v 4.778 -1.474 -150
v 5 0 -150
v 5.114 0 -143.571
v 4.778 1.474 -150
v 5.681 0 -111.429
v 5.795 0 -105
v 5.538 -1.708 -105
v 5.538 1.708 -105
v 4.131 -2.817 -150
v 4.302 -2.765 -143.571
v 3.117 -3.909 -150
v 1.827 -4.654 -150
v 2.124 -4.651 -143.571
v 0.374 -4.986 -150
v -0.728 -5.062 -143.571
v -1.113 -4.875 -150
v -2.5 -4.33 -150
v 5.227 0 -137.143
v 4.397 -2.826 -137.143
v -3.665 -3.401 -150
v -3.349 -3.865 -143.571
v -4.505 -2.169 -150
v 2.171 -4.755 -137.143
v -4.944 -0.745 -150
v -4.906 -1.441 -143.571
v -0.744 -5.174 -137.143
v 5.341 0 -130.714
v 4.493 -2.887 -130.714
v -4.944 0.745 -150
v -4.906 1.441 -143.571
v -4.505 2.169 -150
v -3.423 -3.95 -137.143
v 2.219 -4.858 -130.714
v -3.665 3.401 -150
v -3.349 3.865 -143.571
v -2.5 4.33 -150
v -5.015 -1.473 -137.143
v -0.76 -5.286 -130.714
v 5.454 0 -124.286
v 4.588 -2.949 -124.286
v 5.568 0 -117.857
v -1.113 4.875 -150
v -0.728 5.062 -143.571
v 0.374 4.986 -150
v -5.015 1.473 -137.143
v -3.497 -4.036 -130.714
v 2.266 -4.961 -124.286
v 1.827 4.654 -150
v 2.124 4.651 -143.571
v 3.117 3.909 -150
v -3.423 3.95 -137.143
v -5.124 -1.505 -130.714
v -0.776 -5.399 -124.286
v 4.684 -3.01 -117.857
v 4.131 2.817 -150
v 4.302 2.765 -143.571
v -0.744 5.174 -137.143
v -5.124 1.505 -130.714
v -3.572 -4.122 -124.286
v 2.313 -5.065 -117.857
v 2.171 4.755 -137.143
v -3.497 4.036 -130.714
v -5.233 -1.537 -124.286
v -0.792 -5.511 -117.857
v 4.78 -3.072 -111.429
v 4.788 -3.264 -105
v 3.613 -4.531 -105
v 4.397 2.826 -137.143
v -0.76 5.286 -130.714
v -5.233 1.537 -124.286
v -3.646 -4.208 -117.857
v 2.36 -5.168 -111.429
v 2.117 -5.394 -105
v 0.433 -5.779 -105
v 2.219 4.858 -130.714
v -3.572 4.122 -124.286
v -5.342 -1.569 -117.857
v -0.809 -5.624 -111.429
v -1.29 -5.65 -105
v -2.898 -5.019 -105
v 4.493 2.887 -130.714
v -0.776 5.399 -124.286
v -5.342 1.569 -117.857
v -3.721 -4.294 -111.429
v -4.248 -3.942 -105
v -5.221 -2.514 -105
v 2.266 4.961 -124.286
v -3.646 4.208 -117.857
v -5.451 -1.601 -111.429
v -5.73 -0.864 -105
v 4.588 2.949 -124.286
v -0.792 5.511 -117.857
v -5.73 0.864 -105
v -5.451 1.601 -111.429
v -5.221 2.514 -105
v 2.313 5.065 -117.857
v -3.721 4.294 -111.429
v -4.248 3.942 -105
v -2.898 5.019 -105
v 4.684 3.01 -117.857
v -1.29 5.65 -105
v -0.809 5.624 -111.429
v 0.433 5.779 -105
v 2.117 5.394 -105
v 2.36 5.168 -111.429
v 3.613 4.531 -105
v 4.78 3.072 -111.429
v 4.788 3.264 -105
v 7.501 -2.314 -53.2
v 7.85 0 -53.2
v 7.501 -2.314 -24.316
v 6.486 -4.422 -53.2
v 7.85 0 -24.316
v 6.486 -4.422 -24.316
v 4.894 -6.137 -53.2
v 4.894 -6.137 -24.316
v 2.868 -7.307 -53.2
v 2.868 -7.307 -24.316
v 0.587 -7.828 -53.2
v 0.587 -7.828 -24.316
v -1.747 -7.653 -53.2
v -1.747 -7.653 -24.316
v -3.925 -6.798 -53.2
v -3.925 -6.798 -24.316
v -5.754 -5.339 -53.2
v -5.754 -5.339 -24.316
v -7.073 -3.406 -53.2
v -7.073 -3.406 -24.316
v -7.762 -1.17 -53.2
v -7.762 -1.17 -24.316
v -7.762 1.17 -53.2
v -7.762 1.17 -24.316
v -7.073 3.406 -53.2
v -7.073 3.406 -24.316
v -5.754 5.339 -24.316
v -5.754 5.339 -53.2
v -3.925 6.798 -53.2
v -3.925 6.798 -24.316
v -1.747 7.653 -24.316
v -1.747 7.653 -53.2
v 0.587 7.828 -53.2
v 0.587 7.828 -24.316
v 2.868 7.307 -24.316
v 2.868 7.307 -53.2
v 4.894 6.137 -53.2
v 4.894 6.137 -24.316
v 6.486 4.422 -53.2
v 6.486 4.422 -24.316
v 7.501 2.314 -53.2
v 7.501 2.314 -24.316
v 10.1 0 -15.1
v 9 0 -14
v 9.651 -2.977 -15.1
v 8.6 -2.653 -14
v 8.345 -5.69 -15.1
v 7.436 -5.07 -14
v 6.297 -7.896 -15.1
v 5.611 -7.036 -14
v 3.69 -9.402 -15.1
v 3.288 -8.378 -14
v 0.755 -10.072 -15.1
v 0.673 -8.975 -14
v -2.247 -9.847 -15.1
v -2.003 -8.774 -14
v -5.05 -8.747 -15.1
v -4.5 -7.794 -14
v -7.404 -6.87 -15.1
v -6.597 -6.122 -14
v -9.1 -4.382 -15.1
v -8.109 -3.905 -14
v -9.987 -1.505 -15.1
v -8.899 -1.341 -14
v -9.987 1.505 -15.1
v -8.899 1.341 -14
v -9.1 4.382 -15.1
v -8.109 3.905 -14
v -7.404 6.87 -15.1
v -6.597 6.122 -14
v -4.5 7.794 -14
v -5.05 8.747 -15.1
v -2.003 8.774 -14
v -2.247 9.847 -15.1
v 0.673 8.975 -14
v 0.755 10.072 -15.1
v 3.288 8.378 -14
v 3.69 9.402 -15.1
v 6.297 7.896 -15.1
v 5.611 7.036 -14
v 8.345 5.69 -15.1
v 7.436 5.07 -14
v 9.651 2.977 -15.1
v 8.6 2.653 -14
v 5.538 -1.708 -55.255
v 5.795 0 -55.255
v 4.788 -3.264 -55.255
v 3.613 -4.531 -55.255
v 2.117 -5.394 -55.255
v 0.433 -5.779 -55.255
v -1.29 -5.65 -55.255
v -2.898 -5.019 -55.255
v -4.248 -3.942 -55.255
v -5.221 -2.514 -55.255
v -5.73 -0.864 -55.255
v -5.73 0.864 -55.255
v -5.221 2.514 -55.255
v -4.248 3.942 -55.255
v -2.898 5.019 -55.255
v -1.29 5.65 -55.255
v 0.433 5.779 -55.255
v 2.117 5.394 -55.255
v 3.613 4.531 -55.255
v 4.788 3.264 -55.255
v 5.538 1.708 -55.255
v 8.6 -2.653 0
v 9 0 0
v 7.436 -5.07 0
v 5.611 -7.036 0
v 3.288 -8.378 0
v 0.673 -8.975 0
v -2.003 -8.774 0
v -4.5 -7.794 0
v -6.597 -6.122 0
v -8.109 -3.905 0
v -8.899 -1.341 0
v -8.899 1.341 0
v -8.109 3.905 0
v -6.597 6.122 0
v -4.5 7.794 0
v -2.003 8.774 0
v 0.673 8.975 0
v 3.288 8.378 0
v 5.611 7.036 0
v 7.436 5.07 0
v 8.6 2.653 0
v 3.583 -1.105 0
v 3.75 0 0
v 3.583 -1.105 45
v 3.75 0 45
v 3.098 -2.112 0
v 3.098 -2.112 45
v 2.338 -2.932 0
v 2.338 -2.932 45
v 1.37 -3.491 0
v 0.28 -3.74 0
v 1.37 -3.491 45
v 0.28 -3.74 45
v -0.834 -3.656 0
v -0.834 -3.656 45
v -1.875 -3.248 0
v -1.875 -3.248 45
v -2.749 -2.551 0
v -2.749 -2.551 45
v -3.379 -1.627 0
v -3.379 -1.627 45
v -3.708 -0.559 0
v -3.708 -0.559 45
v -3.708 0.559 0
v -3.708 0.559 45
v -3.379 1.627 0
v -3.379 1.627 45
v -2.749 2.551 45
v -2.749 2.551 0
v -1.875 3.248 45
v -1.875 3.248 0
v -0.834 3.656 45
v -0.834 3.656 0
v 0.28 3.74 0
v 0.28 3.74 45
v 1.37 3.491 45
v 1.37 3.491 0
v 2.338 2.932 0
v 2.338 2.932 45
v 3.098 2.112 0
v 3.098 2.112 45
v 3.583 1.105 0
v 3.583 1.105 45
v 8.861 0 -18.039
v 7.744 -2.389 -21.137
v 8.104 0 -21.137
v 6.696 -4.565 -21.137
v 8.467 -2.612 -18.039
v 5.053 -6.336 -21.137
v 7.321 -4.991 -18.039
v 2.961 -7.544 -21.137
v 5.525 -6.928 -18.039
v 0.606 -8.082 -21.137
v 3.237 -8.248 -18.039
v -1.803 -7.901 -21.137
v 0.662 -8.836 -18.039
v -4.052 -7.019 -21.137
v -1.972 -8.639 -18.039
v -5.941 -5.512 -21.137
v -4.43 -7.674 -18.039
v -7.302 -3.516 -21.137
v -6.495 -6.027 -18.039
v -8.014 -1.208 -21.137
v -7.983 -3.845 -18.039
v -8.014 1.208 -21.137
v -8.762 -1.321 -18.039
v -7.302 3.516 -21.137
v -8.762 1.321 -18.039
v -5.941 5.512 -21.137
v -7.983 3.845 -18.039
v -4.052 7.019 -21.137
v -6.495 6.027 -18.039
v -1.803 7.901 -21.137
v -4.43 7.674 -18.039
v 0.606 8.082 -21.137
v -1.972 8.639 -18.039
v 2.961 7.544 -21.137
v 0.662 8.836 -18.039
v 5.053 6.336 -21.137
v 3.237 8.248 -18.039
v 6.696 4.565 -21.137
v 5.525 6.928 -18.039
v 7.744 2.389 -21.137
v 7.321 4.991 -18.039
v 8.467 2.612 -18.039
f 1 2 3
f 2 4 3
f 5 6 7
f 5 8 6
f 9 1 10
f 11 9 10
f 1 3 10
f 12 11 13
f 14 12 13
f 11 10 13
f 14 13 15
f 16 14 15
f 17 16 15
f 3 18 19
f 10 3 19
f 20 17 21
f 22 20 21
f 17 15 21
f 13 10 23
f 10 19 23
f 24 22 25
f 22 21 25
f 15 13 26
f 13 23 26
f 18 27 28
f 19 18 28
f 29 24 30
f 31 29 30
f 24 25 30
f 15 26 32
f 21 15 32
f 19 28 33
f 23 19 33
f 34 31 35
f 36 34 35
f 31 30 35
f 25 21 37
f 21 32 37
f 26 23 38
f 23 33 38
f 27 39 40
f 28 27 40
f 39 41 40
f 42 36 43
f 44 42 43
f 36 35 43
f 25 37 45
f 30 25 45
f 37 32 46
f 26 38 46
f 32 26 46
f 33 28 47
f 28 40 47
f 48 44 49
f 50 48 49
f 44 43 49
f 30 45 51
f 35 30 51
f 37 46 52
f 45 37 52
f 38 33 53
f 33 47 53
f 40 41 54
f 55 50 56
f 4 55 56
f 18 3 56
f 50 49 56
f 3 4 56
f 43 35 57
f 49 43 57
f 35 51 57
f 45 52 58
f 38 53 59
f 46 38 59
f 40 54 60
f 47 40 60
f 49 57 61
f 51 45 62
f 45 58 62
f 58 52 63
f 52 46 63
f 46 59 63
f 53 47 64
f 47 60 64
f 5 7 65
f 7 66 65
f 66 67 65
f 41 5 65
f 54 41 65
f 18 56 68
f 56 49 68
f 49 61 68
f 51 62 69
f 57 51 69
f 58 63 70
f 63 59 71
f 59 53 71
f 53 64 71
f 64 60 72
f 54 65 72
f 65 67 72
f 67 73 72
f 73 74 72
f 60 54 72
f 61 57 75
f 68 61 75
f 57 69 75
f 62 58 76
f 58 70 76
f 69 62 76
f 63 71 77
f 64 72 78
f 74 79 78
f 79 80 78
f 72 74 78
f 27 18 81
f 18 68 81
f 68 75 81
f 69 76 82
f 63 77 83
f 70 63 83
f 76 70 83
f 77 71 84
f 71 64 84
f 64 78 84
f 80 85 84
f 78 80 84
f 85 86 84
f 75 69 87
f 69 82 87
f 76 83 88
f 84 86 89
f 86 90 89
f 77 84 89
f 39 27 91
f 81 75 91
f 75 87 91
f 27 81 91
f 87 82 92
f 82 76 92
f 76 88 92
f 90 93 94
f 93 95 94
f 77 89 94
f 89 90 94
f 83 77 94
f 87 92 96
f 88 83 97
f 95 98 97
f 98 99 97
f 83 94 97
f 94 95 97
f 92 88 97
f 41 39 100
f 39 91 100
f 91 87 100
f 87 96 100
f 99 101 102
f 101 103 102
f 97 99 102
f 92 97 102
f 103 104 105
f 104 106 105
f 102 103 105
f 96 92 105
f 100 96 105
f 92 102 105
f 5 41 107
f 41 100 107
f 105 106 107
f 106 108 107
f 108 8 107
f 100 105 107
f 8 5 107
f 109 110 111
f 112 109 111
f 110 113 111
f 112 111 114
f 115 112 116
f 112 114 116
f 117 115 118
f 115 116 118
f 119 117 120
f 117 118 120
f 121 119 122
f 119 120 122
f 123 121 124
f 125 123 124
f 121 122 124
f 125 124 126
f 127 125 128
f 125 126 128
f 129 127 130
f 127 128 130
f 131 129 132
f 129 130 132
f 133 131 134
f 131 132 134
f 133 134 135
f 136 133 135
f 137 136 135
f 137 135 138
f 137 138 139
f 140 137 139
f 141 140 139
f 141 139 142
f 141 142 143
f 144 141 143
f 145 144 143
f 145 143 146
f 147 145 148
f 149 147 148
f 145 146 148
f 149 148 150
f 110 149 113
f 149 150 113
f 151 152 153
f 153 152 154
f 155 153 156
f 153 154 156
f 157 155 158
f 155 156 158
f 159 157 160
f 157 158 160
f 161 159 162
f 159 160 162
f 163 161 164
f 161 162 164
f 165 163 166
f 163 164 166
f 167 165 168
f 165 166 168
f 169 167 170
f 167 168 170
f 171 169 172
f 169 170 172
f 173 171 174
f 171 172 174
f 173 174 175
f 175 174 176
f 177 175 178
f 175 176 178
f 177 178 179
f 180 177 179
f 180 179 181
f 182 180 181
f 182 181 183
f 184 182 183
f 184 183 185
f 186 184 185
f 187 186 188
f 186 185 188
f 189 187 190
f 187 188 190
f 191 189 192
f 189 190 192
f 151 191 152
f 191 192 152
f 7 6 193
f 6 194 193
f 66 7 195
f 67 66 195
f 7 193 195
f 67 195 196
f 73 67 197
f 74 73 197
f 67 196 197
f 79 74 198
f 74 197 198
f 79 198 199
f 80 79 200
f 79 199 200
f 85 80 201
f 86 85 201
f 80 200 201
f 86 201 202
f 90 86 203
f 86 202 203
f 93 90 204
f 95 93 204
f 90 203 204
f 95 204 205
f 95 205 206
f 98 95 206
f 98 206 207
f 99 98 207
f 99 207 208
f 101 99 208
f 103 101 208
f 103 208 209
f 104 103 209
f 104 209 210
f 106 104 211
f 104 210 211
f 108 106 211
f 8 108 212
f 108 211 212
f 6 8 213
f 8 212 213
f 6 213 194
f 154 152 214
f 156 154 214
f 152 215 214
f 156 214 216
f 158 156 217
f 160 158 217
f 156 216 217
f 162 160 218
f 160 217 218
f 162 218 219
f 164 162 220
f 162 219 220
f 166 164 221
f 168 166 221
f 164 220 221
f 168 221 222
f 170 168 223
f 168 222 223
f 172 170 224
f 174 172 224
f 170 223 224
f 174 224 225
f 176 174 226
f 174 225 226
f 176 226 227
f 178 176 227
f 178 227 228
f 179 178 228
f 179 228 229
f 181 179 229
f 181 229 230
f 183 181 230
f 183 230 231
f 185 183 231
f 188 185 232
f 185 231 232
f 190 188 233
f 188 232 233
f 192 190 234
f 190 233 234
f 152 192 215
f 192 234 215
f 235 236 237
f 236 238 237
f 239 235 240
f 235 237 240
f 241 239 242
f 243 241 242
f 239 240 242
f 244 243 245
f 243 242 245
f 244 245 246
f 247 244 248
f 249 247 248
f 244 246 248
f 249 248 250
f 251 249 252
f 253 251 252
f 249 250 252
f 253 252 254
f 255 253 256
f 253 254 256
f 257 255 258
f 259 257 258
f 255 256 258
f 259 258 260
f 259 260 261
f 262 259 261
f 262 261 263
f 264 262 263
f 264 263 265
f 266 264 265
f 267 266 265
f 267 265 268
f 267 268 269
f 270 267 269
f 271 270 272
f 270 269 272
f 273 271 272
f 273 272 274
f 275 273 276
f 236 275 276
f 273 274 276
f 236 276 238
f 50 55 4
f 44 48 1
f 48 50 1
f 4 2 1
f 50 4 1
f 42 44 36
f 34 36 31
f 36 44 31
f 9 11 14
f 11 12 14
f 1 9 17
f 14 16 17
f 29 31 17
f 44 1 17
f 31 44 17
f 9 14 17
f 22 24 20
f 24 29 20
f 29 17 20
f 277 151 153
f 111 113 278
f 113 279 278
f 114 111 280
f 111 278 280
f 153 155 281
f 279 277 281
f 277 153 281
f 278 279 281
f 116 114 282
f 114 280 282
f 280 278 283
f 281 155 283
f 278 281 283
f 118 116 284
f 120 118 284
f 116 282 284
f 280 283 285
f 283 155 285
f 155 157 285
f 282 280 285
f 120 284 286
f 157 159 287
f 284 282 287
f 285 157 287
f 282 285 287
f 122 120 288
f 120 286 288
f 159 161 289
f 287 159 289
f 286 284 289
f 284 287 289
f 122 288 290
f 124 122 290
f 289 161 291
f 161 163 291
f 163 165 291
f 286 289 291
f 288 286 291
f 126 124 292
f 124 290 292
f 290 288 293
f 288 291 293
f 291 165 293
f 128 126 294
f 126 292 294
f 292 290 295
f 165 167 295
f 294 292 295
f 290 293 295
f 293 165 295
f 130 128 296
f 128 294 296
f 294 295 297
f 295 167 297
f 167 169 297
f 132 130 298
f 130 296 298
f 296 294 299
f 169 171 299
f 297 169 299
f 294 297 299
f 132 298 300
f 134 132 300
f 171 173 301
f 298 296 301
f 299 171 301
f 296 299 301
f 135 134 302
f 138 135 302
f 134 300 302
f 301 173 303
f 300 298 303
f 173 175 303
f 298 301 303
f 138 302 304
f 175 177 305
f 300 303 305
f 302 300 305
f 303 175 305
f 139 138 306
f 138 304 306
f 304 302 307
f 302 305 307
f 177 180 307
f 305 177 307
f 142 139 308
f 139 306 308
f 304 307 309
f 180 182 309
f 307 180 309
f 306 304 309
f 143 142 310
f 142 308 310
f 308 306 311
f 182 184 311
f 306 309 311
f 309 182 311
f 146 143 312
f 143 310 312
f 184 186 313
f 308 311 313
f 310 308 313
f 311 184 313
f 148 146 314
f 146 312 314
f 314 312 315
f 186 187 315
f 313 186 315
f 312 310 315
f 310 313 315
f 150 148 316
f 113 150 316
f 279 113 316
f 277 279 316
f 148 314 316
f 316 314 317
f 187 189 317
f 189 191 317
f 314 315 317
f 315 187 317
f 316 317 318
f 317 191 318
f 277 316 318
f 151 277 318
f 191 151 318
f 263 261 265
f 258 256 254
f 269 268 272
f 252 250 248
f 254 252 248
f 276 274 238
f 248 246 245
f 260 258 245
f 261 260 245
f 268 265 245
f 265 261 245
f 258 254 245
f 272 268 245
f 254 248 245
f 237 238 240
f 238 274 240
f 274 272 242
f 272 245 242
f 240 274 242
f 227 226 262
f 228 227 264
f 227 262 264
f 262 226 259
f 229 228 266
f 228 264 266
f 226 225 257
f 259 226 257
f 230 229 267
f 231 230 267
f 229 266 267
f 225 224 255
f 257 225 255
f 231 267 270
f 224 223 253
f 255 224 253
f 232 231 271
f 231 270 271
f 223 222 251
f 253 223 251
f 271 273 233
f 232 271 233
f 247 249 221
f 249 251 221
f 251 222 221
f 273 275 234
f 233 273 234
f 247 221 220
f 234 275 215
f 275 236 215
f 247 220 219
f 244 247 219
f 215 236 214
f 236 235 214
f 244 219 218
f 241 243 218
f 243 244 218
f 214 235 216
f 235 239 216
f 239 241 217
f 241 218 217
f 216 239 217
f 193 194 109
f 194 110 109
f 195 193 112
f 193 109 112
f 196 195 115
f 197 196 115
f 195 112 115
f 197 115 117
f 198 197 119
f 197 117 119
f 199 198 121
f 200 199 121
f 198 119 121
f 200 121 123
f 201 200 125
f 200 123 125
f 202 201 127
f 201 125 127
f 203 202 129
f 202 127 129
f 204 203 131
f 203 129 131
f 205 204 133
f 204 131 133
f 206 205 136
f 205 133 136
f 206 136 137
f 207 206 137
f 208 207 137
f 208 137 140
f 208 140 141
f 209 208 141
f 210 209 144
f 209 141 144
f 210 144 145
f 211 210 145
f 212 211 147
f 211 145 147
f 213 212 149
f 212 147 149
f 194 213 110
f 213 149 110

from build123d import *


with BuildPart() as f1:
    # F0 (on Front) → F1 (revolve)
    with BuildSketch(Plane.XZ):
        with BuildLine():
            Line((0, 45), (0, -150))
            Line((0, -150), (5, -150))
            Line((5, -150), (5.795, -105))
            Line((5.795, -105), (5.795, -55.255))
            Line((5.795, -55.255), (7.85, -53.2))
            Line((7.85, -53.2), (7.85, -24.316154))
            ThreePointArc((7.85, -24.316154), (8.420641, -19.572738), (10.1, -15.1))
            Line((10.1, -15.1), (9, -14))
            Line((9, -14), (9, 0))
            Line((9, 0), (3.75, 0))
            Line((3.75, 0), (3.75, 45))
            Line((3.75, 45), (0, 45))
        make_face()
    revolve(axis=Axis((0, 0, -52.5), (0, 0, -1)))


solid = f1.part
